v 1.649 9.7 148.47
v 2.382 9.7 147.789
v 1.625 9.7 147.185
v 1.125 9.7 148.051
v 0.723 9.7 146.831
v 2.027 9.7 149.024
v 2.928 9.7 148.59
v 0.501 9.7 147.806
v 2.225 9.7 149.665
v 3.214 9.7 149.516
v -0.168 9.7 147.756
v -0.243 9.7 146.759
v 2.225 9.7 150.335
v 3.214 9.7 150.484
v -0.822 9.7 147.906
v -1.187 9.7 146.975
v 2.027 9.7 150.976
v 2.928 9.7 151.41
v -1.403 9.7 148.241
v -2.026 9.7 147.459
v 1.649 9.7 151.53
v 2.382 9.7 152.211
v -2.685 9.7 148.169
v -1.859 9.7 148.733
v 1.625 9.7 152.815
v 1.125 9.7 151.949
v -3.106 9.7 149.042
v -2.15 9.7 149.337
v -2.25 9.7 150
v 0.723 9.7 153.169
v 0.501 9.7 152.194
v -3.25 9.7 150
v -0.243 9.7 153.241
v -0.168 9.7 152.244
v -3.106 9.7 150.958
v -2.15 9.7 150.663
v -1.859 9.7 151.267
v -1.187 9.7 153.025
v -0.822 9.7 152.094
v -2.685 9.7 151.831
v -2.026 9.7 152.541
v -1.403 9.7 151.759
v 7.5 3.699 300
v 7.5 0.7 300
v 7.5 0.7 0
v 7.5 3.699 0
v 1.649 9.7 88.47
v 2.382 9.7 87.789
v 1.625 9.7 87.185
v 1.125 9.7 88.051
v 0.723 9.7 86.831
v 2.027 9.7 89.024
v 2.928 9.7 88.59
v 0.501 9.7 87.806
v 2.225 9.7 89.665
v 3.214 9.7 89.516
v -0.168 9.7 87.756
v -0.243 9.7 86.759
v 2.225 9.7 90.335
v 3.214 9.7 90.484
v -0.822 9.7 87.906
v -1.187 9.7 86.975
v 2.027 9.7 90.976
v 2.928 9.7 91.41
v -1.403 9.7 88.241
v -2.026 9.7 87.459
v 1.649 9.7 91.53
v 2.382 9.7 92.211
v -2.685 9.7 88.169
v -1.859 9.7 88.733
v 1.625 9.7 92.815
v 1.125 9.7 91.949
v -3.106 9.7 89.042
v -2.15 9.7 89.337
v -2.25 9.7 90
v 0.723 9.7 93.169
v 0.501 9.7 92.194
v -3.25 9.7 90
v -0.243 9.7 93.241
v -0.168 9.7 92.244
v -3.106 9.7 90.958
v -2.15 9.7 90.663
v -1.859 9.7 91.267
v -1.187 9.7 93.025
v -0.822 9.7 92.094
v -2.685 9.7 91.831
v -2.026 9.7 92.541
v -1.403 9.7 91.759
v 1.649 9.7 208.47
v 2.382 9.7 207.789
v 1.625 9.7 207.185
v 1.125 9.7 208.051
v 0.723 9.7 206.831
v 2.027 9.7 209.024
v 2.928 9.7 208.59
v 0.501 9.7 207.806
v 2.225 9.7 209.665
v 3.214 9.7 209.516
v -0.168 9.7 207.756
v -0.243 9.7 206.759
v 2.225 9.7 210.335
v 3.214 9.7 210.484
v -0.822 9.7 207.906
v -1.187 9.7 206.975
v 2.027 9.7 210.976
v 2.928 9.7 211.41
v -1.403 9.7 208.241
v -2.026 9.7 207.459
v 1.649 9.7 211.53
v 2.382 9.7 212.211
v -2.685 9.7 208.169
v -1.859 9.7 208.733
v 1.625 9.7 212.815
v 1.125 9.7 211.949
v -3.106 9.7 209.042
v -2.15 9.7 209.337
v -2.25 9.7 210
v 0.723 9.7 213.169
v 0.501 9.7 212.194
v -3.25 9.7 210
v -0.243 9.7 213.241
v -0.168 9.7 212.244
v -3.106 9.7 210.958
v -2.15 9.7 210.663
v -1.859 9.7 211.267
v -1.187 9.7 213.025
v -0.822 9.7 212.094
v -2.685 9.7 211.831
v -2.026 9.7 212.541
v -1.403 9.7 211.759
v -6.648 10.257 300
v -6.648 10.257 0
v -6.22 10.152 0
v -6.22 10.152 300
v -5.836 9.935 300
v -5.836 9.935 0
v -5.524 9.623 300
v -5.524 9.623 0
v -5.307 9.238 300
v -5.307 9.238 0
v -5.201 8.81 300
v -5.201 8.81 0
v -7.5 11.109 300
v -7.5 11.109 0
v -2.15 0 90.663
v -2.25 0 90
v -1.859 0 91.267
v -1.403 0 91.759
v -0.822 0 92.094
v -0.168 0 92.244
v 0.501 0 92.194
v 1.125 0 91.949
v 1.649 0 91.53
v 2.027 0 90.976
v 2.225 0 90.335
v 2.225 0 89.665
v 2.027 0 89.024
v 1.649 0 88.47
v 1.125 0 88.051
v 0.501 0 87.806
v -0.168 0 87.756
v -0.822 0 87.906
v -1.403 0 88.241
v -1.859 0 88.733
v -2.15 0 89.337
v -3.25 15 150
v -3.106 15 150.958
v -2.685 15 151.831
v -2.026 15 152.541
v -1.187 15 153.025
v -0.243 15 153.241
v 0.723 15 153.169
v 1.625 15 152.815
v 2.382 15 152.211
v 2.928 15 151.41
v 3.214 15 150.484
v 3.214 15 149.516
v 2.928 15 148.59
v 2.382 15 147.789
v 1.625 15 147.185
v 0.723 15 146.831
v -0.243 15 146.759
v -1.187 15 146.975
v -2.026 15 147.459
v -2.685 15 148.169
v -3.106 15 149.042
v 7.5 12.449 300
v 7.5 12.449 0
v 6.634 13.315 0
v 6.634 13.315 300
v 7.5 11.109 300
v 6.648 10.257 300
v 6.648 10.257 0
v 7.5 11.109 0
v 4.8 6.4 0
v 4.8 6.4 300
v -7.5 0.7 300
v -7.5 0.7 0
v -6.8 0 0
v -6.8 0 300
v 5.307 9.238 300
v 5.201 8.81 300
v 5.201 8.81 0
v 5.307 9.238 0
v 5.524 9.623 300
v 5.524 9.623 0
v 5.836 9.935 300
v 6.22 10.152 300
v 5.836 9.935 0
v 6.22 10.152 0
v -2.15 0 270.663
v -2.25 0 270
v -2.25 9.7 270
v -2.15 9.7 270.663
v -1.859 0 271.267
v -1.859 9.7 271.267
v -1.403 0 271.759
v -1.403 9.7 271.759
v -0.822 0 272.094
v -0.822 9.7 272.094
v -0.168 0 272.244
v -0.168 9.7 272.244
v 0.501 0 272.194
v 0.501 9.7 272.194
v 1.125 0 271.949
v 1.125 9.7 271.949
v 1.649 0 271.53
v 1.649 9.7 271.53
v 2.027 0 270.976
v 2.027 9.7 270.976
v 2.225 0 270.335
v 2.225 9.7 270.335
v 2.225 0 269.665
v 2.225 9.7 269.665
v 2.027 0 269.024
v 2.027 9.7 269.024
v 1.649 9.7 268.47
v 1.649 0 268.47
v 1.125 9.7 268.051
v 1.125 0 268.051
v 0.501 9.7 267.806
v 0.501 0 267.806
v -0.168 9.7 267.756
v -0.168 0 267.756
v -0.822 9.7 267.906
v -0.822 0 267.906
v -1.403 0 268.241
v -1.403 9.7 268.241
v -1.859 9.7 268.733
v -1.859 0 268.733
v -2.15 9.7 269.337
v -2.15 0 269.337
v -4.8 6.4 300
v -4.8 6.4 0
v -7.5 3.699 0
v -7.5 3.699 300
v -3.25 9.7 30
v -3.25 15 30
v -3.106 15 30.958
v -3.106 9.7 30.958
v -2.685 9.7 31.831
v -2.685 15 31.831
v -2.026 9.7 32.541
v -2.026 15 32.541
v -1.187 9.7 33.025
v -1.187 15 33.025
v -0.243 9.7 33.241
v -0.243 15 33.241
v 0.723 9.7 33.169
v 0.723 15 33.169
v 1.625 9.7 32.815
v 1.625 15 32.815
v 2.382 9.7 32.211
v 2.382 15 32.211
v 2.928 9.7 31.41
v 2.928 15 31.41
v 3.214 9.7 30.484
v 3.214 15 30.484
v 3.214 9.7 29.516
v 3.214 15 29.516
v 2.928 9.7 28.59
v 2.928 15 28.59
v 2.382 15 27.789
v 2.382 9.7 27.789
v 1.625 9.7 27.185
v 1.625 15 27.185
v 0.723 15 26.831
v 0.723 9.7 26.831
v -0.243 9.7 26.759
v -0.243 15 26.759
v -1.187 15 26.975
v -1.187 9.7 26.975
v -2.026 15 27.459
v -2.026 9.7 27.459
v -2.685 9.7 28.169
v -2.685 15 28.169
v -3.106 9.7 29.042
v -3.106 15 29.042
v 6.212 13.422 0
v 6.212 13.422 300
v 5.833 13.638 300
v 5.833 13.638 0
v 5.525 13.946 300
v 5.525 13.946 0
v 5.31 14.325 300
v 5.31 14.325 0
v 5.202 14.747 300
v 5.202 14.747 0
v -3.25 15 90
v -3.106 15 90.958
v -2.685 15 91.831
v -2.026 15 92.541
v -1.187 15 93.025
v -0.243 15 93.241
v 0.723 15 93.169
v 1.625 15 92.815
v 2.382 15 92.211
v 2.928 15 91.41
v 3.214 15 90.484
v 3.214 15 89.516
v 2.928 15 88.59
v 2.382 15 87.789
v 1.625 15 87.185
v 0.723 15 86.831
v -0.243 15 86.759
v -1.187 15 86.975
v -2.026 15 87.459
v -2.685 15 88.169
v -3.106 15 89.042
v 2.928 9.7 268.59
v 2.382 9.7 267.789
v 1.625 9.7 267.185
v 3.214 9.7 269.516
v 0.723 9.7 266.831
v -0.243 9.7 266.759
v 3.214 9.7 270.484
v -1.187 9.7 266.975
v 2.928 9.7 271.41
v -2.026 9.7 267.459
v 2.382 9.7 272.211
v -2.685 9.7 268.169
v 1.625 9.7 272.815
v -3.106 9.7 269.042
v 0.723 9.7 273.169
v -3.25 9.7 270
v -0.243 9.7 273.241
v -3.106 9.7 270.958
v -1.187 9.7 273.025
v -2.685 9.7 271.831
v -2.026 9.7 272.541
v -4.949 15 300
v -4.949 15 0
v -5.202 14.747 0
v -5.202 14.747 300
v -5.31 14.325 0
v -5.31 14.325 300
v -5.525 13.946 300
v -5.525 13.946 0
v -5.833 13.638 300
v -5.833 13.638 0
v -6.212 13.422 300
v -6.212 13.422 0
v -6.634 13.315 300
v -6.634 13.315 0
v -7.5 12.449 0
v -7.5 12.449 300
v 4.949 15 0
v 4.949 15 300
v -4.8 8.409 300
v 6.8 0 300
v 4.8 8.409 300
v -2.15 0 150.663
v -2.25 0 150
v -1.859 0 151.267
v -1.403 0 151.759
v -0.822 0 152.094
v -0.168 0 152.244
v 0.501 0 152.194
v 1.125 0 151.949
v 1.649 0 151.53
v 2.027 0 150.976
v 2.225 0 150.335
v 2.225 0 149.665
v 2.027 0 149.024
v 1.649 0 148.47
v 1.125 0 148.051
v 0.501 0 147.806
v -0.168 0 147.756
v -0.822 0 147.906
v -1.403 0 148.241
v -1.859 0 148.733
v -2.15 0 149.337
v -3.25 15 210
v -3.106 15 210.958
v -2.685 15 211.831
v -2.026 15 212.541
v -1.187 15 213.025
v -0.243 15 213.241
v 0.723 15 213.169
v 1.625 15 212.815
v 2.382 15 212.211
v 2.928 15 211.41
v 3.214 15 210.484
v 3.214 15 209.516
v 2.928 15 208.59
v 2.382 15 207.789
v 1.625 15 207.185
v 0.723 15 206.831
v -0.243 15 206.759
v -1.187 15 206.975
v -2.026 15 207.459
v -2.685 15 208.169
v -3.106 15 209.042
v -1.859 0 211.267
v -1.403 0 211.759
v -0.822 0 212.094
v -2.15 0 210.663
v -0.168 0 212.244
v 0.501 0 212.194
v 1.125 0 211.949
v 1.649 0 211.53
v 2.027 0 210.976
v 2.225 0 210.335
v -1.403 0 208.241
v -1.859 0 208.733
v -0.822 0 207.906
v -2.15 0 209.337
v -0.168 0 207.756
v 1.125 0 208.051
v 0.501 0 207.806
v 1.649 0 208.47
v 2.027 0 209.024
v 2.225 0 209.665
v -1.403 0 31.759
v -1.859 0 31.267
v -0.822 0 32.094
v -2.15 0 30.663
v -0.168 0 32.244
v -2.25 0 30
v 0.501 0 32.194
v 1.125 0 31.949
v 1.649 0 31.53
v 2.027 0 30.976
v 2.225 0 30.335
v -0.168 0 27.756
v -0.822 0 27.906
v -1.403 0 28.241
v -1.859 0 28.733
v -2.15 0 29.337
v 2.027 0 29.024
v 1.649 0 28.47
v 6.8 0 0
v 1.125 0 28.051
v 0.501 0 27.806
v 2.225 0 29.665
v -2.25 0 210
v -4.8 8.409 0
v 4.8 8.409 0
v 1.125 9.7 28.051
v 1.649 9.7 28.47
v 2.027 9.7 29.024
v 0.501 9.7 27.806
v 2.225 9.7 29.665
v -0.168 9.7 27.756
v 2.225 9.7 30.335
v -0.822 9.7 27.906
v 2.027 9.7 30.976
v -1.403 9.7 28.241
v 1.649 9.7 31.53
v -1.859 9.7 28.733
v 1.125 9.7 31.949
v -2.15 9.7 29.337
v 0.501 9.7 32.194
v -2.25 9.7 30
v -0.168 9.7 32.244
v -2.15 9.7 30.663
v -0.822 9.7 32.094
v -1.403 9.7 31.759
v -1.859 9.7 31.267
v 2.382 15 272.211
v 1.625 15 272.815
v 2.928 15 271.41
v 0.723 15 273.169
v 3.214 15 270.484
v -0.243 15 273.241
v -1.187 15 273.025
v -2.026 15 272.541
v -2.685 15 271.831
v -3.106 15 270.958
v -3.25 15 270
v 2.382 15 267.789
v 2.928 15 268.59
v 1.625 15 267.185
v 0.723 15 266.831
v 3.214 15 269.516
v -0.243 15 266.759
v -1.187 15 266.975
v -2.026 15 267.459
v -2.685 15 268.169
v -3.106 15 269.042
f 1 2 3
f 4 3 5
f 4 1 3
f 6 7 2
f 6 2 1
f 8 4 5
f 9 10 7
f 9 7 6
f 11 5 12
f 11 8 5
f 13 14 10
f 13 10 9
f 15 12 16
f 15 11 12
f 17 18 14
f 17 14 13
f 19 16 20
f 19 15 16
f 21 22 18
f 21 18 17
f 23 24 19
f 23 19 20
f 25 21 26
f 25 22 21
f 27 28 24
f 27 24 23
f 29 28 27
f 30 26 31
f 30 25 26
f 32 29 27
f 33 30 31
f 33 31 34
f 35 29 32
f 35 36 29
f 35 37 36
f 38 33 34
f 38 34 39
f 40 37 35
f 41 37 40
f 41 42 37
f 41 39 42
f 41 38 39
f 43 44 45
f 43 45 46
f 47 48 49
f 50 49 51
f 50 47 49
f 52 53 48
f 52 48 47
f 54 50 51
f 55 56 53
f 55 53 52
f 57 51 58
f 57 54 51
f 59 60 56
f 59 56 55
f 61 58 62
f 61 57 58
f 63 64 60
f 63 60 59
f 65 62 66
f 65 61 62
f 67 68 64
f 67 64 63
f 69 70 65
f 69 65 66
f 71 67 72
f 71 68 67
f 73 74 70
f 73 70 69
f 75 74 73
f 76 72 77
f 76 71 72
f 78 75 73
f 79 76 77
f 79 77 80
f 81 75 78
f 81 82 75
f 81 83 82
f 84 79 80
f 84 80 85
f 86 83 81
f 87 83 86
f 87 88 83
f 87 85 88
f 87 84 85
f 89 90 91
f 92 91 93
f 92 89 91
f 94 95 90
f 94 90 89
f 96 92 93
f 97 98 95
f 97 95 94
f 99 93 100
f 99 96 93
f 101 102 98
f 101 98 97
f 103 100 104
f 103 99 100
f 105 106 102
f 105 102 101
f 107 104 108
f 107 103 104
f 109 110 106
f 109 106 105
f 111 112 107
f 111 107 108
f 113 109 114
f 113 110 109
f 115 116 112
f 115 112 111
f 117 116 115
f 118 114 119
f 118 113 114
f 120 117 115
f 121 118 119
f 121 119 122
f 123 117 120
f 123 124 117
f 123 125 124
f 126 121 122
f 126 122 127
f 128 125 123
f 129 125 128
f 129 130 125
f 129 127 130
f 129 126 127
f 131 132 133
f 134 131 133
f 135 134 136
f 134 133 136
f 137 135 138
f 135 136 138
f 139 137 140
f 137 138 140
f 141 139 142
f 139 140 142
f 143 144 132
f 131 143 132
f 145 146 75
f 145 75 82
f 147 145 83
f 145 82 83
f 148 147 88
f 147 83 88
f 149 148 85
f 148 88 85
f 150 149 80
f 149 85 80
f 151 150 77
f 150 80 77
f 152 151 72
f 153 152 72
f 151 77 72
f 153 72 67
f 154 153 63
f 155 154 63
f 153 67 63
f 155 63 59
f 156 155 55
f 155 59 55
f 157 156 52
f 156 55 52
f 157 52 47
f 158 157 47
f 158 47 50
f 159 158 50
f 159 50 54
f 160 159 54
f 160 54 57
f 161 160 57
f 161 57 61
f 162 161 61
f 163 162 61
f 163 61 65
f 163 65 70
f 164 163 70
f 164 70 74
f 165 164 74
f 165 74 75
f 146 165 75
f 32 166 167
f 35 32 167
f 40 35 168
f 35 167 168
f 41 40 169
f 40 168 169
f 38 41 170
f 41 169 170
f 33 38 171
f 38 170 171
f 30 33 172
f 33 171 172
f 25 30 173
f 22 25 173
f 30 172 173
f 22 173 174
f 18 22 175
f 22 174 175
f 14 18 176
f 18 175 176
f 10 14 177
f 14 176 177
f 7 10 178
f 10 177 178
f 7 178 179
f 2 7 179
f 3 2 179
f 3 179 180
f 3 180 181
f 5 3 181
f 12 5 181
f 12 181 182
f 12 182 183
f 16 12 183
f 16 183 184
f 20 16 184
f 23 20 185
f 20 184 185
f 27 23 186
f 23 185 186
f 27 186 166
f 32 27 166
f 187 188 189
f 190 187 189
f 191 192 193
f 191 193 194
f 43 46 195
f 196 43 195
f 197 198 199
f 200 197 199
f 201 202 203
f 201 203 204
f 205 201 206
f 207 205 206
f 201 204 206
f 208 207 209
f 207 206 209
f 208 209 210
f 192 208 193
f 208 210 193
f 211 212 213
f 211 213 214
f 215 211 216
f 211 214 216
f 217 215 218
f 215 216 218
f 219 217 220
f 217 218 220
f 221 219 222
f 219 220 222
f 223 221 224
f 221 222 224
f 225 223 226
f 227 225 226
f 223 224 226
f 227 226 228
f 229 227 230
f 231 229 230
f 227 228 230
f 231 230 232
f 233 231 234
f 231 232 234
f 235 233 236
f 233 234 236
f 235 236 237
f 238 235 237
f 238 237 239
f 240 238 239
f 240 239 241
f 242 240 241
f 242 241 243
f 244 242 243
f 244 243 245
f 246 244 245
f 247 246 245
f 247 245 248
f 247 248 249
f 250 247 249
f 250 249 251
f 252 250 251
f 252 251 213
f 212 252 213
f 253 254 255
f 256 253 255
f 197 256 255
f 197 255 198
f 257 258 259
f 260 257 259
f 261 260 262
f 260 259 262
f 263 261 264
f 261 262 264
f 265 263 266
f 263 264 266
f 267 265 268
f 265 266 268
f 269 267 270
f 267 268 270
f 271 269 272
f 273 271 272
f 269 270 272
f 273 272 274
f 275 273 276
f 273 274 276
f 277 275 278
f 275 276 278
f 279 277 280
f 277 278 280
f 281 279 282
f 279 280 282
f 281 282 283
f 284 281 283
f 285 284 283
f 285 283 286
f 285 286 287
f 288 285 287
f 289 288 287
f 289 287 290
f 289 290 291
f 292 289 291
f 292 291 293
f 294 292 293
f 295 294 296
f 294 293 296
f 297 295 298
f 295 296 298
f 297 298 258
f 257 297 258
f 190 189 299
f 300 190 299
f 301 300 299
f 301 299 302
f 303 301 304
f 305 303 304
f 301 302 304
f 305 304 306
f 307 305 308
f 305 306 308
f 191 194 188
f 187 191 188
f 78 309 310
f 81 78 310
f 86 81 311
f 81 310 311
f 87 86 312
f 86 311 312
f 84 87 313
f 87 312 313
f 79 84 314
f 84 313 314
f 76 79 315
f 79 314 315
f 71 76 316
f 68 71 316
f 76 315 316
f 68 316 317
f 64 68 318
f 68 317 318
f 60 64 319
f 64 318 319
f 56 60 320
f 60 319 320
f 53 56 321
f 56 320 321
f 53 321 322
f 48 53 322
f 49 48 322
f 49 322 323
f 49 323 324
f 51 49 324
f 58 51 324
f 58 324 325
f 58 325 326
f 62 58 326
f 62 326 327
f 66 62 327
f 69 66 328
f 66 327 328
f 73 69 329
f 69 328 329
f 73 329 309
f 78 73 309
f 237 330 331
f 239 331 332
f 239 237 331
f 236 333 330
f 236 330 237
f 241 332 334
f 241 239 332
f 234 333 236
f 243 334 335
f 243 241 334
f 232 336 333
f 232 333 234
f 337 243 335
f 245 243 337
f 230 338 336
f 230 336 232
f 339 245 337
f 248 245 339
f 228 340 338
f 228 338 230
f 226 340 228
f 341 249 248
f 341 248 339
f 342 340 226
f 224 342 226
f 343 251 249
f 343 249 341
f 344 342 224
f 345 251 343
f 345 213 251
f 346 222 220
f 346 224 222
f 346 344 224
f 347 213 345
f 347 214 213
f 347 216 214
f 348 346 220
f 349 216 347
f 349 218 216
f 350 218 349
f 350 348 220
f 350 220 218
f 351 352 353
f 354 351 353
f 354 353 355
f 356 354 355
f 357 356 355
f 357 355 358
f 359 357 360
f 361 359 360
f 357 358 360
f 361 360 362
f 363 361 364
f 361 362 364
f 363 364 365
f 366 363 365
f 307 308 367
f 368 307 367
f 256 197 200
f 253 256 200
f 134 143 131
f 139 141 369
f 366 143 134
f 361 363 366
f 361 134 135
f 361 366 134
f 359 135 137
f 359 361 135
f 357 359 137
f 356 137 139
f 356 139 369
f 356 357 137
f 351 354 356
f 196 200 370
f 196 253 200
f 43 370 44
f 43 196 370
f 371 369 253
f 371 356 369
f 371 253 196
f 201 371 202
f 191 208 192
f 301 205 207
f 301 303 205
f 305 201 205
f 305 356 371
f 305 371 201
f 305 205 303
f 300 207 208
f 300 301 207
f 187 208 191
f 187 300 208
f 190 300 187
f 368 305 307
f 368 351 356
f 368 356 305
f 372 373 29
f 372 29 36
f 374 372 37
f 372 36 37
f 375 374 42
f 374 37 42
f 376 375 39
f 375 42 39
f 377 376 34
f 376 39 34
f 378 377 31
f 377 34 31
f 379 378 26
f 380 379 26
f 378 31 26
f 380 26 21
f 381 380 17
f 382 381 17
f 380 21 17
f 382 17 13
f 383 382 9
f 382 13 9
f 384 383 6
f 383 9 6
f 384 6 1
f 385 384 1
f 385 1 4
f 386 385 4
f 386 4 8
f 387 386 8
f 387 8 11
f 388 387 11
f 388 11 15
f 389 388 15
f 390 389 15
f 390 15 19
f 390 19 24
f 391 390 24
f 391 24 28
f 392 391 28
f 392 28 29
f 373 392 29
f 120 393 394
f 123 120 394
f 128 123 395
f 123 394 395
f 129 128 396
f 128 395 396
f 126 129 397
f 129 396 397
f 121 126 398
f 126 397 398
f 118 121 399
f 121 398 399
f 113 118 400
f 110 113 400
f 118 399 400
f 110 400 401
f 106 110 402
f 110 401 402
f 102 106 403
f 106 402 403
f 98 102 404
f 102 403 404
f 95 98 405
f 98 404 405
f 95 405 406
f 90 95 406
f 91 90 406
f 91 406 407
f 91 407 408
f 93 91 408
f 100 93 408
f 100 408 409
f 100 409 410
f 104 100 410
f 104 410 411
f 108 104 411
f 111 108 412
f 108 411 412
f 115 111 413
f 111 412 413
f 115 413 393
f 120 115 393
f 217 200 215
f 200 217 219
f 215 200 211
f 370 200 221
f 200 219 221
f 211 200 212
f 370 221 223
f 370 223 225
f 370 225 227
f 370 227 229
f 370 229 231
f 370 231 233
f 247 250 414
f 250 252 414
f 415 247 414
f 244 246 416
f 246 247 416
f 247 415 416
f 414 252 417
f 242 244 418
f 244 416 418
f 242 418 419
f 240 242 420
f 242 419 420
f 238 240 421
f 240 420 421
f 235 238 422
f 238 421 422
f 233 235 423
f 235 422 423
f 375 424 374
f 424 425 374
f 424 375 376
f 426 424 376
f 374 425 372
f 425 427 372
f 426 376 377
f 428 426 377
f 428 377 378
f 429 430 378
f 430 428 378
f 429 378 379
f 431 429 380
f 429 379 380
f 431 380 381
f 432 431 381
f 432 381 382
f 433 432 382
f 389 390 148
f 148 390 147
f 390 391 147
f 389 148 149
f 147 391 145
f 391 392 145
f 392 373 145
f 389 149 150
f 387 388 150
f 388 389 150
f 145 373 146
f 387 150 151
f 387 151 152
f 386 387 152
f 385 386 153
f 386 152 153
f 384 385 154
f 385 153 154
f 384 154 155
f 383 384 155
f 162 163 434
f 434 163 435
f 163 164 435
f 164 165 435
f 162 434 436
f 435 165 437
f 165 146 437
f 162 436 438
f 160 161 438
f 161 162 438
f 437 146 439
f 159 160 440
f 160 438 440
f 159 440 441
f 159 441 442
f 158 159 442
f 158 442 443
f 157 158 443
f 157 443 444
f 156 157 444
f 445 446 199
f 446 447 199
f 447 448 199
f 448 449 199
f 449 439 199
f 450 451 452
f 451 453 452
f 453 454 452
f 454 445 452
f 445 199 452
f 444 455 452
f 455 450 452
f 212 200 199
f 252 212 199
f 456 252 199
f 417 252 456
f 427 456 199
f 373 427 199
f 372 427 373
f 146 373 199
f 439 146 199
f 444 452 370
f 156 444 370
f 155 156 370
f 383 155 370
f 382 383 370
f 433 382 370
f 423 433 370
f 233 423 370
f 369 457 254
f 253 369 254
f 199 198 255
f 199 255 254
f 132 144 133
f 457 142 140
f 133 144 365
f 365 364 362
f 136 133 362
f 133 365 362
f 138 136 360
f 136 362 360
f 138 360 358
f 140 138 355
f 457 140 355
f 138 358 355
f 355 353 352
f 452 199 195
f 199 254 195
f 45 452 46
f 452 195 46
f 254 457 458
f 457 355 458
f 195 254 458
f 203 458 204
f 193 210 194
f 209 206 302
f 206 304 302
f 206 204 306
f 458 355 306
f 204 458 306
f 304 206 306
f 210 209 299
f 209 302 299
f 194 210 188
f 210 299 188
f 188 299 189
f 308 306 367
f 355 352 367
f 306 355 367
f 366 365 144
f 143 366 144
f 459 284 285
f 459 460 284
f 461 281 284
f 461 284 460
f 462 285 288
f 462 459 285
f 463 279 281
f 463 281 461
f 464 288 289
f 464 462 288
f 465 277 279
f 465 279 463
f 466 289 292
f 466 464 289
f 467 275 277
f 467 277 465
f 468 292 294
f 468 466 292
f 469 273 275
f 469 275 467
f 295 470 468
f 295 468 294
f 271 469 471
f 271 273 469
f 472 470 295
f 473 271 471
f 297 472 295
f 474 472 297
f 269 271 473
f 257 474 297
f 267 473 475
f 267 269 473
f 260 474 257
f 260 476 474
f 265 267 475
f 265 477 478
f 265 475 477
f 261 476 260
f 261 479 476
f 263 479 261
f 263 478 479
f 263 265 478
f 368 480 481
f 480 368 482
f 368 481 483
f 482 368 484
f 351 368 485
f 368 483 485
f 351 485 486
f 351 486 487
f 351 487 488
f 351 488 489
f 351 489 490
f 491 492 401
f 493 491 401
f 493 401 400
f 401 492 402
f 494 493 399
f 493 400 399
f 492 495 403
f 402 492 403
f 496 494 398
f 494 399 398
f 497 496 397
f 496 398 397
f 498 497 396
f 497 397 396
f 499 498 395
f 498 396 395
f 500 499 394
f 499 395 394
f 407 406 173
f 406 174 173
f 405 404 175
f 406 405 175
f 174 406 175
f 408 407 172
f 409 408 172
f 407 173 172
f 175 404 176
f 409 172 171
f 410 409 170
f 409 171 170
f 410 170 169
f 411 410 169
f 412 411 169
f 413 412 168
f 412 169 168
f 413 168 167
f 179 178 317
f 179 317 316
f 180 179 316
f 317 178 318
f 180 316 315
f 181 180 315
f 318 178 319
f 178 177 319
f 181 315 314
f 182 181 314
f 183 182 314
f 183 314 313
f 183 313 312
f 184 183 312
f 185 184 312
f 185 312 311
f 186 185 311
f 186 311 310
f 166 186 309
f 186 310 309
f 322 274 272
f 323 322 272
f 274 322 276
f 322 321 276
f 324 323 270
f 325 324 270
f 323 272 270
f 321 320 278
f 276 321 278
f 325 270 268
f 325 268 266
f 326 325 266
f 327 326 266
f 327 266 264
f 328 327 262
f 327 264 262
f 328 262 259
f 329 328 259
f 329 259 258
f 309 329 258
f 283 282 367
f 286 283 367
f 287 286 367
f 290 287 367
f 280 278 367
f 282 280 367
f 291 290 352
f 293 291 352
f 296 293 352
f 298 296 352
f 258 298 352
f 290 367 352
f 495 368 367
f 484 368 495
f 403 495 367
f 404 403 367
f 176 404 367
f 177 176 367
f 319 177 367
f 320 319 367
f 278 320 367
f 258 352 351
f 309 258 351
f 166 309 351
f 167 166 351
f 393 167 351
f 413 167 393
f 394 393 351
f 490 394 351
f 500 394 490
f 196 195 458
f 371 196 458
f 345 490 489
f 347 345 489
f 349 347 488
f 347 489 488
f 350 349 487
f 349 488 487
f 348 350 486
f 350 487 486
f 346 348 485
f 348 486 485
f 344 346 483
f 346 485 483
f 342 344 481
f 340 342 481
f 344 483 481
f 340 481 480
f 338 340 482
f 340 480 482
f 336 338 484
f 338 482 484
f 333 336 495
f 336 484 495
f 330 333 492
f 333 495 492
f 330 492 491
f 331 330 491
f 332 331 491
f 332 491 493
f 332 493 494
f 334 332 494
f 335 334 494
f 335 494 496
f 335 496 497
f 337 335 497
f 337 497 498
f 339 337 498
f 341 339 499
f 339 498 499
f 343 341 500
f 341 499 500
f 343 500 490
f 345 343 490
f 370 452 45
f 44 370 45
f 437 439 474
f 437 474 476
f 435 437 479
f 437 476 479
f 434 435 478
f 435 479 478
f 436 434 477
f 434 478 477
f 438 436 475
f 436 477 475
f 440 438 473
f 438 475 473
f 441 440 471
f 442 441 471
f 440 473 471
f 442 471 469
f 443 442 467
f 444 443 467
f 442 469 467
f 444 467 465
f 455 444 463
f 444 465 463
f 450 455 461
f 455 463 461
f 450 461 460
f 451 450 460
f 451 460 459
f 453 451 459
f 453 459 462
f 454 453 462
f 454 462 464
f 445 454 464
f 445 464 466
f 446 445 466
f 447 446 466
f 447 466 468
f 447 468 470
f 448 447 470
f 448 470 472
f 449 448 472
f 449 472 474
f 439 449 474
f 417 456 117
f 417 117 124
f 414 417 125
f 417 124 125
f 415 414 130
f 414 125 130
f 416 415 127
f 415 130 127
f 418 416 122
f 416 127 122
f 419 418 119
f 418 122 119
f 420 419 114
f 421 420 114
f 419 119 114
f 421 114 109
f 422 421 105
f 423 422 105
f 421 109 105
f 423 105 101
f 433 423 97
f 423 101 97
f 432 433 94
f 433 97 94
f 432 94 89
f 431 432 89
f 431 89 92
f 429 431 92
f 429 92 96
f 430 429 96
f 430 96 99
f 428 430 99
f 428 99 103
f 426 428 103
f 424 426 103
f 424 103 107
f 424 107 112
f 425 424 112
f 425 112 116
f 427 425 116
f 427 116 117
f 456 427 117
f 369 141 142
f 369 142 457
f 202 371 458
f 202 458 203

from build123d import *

# Parameters (mm, degrees)
EXTRUDE_1_DEPTH     = 300
SKETCH_2_R          = 3.25
CUT_EXTRUDE_1_DEPTH = 5.3
SKETCH_3_R          = 2.25
CUT_EXTRUDE_2_DEPTH = 301.250462115


with BuildPart() as part:
    # Model → Бобышка-Вытянуть1 (new body)
    with BuildSketch(Plane.XY):
        with BuildLine():
            Line((6.8, 0), (7.5, 0.7))
            Line((7.5, 0.7), (7.5, 3.6994391))
            Line((7.5, 3.6994391), (4.7998047, 6.3996344))
            Line((4.7998047, 6.3996344), (4.7998047, 8.409149262))
            Line((4.7998047, 8.409149262), (5.20075838, 8.810103152))
            ThreePointArc((5.20075838, 8.810103152), (5.668922208, 9.789261508), (6.648080611, 10.257425237))
            Line((6.648080611, 10.257425237), (7.5, 11.109345046))
            Line((7.5, 11.109345046), (7.5, 12.449454443))
            Line((7.5, 12.449454443), (6.634490912, 13.314965186))
            ThreePointArc((6.634490912, 13.314965186), (5.668922174, 13.781617126), (5.202270193, 14.747185846))
            Line((5.202270193, 14.747185846), (4.949456226, 15))
            Line((4.949456226, 15), (-4.949456226, 15))
            Line((-4.949456226, 15), (-5.202270193, 14.747185846))
            ThreePointArc((-5.202270193, 14.747185846), (-5.668922174, 13.781617126), (-6.634490912, 13.314965186))
            Line((-6.634490912, 13.314965186), (-7.5, 12.449454443))
            Line((-7.5, 12.449454443), (-7.5, 11.109345046))
            Line((-7.5, 11.109345046), (-6.648080611, 10.257425238))
            ThreePointArc((-6.648080611, 10.257425238), (-5.668922208, 9.789261508), (-5.20075838, 8.810103152))
            Line((-5.20075838, 8.810103152), (-4.7998047, 8.409149262))
            Line((-4.7998047, 8.409149262), (-4.7998047, 6.3996344))
            Line((-4.7998047, 6.3996344), (-7.5, 3.6994391))
            Line((-7.5, 3.6994391), (-7.5, 0.7))
            Line((-7.5, 0.7), (-6.8, 0))
            Line((-6.8, 0), (6.8, 0))
        make_face()
    extrude(amount=EXTRUDE_1_DEPTH)

    # Эскиз2 → Вырез-Вытянуть1 (cut)
    with BuildSketch(Plane(origin=(0, 15, 0), x_dir=(1, 0, 0), z_dir=(0, 1, 0))):
        with Locations(Location((0, -30, 0), (0, 0, 180))):
            Circle(SKETCH_2_R)
        with Locations(Location((0, -90, 0), (0, 0, 180))):
            Circle(SKETCH_2_R)
        with Locations(Location((0, -150, 0), (0, 0, 180))):
            Circle(SKETCH_2_R)
        with Locations(Location((0, -210, 0), (0, 0, 180))):
            Circle(SKETCH_2_R)
        with Locations(Location((0, -270, 0), (0, 0, 180))):
            Circle(SKETCH_2_R)
        with Locations((0, -330)):
            Circle(SKETCH_2_R)
        with Locations((0, -390)):
            Circle(SKETCH_2_R)
        with Locations((0, -450)):
            Circle(SKETCH_2_R)
        with Locations((0, -510)):
            Circle(SKETCH_2_R)
        with Locations((0, -570)):
            Circle(SKETCH_2_R)
    extrude(amount=-CUT_EXTRUDE_1_DEPTH, mode=Mode.SUBTRACT)

    # Эскиз3 → Вырез-Вытянуть2 (cut, through all)
    with BuildSketch(Plane(origin=(0, 9.7, 0), x_dir=(1, 0, 0), z_dir=(0, 1, 0))):
        with Locations(Location((0, -30, 0), (0, 0, 180))):
            Circle(SKETCH_3_R)
        with Locations(Location((0, -90, 0), (0, 0, 180))):
            Circle(SKETCH_3_R)
        with Locations(Location((0, -150, 0), (0, 0, 180))):
            Circle(SKETCH_3_R)
        with Locations(Location((0, -210, 0), (0, 0, 180))):
            Circle(SKETCH_3_R)
        with Locations(Location((0, -270, 0), (0, 0, 180))):
            Circle(SKETCH_3_R)
        with Locations((0, -330)):
            Circle(SKETCH_3_R)
        with Locations((0, -390)):
            Circle(SKETCH_3_R)
        with Locations((0, -450)):
            Circle(SKETCH_3_R)
        with Locations((0, -510)):
            Circle(SKETCH_3_R)
        with Locations((0, -570)):
            Circle(SKETCH_3_R)
    extrude(amount=-CUT_EXTRUDE_2_DEPTH, mode=Mode.SUBTRACT)


solid = part.part
